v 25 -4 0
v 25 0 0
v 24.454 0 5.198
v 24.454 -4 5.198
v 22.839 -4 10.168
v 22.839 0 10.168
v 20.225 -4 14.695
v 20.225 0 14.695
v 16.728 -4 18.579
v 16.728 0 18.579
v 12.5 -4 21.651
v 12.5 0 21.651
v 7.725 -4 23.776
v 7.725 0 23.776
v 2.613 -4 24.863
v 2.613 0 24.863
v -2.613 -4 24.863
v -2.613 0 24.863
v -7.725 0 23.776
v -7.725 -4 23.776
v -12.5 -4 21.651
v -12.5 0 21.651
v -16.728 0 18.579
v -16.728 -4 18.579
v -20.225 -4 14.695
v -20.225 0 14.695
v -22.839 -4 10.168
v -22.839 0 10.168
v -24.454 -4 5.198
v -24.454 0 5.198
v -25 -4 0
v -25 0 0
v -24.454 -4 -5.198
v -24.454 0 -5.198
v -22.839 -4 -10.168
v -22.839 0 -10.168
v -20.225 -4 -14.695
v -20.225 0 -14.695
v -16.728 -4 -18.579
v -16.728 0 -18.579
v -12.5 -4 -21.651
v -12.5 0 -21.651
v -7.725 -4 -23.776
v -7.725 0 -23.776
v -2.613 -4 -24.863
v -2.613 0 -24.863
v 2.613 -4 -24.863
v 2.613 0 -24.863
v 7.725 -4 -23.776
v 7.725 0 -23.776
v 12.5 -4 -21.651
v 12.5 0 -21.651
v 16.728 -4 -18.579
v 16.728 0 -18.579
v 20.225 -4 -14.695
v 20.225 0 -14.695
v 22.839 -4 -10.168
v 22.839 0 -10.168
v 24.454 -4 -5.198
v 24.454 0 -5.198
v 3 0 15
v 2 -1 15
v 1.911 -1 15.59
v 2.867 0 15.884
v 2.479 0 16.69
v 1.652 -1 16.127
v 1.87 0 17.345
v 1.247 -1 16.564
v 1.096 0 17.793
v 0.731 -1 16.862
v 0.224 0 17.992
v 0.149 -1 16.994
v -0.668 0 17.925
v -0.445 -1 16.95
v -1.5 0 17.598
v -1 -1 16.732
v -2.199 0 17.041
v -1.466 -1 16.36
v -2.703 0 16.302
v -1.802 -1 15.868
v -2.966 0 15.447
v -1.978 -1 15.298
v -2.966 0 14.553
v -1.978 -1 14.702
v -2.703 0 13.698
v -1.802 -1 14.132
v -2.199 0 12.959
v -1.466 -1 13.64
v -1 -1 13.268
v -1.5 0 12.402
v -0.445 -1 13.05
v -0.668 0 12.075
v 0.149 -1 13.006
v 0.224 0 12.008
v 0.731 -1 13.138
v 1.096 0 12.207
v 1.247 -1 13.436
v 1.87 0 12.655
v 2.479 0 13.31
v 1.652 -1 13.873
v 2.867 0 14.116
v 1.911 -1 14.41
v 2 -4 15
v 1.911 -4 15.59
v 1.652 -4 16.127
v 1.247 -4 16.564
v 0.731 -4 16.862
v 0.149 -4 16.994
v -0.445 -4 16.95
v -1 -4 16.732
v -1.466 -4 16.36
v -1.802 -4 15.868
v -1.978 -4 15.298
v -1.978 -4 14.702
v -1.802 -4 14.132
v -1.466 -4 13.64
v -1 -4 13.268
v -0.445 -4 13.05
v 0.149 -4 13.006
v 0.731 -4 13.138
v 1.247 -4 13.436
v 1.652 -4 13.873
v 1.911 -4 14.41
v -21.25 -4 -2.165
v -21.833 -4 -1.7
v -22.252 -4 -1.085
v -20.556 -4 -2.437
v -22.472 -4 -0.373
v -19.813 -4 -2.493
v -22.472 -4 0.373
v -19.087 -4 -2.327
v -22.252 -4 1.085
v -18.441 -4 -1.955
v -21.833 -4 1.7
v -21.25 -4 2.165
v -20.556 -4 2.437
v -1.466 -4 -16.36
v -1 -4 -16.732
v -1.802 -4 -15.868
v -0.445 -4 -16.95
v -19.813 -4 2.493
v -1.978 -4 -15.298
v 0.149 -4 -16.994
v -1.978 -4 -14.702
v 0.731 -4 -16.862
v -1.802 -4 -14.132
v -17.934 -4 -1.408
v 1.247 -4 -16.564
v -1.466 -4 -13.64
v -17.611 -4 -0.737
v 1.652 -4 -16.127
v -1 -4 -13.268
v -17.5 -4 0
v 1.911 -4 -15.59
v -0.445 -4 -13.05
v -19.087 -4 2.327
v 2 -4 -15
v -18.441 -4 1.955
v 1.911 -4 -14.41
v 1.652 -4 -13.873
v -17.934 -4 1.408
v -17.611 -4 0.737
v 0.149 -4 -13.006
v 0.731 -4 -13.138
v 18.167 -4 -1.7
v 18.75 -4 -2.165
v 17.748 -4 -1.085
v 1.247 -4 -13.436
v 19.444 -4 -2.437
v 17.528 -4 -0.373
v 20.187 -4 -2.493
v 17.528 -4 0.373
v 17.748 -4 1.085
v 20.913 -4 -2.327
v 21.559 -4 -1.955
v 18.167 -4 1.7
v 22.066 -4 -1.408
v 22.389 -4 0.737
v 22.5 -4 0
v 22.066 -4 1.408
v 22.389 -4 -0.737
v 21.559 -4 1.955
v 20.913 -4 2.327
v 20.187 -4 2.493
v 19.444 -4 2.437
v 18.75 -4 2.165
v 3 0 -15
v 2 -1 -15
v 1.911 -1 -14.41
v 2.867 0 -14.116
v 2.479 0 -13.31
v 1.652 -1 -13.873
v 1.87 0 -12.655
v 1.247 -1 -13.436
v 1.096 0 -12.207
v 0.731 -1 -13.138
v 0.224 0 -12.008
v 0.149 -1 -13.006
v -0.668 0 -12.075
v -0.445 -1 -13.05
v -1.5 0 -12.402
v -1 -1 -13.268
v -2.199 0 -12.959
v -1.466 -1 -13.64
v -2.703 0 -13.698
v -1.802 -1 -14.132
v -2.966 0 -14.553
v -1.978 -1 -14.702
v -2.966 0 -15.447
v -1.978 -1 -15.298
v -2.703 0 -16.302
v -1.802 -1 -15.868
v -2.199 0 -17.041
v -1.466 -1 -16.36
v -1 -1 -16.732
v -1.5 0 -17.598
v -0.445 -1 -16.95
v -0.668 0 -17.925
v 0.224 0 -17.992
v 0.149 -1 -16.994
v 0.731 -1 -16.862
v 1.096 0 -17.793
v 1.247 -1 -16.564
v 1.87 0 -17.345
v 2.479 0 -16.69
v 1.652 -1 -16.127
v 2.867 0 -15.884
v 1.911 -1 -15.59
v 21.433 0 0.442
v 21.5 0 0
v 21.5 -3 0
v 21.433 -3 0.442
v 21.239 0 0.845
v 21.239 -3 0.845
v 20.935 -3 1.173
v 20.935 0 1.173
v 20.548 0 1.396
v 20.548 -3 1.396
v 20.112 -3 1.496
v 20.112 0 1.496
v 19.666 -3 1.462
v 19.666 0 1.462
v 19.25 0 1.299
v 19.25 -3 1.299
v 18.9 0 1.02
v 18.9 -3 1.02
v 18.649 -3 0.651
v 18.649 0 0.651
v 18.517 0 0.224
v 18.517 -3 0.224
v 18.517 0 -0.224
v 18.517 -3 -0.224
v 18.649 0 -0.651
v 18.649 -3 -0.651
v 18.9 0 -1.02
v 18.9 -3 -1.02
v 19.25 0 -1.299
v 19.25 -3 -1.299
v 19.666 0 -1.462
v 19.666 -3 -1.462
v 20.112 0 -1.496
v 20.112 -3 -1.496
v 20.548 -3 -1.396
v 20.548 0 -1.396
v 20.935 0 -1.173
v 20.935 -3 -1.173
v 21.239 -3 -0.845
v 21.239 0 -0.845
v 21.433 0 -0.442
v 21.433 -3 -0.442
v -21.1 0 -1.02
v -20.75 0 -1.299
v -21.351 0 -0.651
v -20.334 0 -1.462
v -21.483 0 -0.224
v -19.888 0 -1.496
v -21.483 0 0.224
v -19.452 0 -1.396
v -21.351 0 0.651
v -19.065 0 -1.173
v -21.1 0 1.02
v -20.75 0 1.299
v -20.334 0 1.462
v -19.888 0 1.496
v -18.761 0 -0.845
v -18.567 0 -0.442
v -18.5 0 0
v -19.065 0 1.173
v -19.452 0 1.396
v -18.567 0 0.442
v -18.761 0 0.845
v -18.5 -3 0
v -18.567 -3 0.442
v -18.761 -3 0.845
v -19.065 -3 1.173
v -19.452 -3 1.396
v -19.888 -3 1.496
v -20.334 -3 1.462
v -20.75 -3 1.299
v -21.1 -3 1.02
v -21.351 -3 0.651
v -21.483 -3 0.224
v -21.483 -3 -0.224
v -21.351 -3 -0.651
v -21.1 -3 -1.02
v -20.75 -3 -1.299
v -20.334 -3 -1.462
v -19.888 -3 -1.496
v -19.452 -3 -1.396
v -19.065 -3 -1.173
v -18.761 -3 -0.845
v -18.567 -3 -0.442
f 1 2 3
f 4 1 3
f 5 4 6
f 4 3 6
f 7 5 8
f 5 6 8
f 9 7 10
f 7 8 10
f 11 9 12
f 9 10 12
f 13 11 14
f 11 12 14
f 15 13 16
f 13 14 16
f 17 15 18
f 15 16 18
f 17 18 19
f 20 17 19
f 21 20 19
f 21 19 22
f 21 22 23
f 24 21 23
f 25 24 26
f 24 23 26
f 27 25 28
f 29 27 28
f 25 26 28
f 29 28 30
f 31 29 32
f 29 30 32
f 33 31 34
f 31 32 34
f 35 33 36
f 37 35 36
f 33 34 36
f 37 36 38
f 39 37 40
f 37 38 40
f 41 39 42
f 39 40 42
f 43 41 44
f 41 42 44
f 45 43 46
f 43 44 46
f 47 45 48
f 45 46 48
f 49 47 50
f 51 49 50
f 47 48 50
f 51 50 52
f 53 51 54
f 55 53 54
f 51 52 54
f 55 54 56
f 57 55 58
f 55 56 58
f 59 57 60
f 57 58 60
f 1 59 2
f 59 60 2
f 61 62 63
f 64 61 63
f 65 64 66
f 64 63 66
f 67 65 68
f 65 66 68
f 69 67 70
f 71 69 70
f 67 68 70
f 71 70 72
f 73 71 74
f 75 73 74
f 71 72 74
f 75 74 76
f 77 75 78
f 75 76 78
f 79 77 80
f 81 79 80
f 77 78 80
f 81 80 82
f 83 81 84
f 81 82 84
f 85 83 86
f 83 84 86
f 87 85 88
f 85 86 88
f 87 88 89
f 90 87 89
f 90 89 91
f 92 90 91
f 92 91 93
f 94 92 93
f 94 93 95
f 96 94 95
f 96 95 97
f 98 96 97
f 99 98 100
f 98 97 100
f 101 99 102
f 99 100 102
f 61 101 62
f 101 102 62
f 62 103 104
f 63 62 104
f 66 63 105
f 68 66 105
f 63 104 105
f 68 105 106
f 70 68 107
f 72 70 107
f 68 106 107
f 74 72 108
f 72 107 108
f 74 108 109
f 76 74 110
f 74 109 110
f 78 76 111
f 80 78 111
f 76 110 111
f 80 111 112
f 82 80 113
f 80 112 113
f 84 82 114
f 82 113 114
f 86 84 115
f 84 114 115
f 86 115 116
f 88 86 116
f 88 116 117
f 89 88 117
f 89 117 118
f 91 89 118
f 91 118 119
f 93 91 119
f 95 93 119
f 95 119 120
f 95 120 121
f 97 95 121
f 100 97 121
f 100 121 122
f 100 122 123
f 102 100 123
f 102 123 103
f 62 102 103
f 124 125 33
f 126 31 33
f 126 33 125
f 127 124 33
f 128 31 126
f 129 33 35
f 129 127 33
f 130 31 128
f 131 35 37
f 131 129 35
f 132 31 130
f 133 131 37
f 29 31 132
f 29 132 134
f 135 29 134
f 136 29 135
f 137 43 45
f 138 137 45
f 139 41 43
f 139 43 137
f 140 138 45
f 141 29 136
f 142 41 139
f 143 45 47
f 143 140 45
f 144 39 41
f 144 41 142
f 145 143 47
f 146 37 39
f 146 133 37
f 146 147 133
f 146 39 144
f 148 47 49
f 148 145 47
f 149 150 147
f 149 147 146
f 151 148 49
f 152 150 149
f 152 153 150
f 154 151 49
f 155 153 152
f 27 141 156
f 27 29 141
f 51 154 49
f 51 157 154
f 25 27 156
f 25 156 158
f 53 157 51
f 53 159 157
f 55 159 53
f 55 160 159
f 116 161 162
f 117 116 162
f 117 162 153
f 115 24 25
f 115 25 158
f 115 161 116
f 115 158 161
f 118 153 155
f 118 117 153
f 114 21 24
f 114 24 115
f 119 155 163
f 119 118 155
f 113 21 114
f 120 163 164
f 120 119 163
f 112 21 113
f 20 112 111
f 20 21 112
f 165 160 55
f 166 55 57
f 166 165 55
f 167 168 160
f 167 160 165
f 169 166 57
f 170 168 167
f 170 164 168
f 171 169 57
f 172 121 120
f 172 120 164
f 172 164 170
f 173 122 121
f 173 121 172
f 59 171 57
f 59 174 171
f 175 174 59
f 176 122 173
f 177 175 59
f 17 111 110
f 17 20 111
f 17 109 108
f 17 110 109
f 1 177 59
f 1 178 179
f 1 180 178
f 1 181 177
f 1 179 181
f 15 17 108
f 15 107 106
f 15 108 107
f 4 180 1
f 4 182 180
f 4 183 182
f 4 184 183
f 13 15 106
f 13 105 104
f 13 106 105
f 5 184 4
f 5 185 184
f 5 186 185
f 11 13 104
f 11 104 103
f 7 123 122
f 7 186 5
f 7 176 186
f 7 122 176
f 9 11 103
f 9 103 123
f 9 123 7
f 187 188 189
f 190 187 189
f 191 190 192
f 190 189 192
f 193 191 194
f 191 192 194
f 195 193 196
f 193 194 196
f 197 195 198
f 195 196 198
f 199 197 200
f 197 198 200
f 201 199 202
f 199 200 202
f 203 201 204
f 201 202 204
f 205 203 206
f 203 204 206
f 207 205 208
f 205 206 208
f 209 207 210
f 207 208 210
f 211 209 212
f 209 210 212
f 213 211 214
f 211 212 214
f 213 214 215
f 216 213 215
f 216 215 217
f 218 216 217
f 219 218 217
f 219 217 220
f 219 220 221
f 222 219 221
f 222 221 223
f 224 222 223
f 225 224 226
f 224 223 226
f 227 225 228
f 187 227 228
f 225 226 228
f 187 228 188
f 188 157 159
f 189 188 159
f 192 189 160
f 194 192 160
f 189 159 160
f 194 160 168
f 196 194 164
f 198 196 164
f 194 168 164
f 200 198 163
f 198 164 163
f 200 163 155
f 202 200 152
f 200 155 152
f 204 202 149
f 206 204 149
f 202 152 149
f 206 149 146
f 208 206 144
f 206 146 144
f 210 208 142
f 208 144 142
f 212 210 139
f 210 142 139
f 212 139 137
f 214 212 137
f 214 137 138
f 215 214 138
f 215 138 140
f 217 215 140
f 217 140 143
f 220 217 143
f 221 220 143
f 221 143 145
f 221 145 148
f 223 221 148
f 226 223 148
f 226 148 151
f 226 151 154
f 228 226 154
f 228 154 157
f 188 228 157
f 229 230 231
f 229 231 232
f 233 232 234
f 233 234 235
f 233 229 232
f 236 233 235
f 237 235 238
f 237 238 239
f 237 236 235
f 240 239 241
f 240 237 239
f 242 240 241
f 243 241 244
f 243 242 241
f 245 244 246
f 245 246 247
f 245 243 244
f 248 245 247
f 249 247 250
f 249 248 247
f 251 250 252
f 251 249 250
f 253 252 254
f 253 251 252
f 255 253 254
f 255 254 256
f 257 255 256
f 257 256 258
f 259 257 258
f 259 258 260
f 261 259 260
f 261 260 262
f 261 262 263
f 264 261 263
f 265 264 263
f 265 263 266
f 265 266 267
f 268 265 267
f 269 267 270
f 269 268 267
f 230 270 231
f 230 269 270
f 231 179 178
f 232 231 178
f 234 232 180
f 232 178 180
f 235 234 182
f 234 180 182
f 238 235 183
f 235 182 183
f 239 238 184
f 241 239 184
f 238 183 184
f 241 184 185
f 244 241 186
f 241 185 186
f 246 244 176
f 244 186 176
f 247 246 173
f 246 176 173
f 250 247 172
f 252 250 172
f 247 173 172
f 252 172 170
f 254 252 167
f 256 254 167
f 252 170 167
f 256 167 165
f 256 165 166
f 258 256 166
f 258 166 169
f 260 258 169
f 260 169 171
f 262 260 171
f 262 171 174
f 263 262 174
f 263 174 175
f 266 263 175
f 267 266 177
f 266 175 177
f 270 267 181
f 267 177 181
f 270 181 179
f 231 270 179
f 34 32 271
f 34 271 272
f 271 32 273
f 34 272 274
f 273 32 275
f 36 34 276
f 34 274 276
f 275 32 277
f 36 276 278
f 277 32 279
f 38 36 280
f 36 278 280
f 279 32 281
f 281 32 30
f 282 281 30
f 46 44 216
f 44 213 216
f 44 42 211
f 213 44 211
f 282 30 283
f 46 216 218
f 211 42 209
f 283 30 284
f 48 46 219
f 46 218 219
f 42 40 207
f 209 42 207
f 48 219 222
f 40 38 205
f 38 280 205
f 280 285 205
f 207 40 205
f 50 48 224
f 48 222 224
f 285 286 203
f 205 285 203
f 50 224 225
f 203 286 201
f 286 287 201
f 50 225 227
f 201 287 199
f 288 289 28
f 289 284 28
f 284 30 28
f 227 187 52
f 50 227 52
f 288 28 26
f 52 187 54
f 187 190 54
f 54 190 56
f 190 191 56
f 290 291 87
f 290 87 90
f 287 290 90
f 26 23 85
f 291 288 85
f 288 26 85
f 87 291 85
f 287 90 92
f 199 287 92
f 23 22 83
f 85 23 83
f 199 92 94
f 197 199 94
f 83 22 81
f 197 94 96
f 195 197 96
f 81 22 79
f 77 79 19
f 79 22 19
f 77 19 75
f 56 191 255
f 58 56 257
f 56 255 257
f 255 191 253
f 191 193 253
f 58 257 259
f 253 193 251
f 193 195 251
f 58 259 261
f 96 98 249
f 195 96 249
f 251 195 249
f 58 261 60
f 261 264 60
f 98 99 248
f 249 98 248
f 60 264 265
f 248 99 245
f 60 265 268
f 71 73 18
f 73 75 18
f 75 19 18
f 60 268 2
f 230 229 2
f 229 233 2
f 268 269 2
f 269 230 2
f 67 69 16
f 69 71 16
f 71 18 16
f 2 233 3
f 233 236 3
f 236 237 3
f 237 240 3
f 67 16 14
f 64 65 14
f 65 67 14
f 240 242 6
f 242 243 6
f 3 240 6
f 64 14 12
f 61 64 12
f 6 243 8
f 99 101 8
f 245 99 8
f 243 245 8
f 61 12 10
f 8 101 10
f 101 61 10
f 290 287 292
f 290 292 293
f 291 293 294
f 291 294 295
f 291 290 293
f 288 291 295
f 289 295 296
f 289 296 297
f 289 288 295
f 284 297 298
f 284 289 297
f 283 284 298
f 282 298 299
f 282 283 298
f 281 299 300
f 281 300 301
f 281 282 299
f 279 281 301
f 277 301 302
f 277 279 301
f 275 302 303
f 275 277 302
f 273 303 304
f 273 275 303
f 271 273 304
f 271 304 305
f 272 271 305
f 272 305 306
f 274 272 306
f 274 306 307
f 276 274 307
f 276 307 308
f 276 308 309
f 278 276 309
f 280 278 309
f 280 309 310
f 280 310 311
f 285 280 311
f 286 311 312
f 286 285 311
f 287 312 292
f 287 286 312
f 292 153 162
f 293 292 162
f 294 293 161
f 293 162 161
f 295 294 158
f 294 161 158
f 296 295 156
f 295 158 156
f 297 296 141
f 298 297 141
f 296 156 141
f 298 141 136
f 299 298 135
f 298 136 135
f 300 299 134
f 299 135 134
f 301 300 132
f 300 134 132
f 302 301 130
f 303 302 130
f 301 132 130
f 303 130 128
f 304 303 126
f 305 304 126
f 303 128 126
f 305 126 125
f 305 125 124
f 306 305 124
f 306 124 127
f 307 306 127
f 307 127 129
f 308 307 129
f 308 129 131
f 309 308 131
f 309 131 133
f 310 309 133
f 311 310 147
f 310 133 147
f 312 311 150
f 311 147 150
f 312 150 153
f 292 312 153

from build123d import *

# Parameters (mm, degrees)
F0_R     = 25
F0_R_2   = 1.5
F1_DEPTH = 4
F2_SIZE  = 1
F3_R     = 2
F4_DEPTH = 4.001
F5_SIZE  = 1


with BuildPart() as f1:
    # F0 (on Front) → F1 (new body)
    with BuildSketch(Plane.XZ):
        Circle(F0_R)
        with Locations((-20, 0)):
            Circle(F0_R_2, mode=Mode.SUBTRACT)
        with Locations((20, 0)):
            Circle(F0_R_2, mode=Mode.SUBTRACT)
    extrude(amount=F1_DEPTH)

    # F2
    f2_edges = [f1.edges().sort_by_distance(p)[0] for p in [
        (-21.5, -4, 0),
        (18.5, -4, 0),
    ]]
    chamfer(f2_edges, length=F2_SIZE)

    # F3 (on face) → F4 (cut, through all)
    with BuildSketch(Plane.XZ.offset(4)):
        with Locations((0, 15)):
            Circle(F3_R)
        with Locations((0, -15)):
            Circle(F3_R)
    extrude(amount=-F4_DEPTH, mode=Mode.SUBTRACT)

    # F5
    f5_edges = [f1.edges().sort_by_distance(p)[0] for p in [
        (-2, 0, 15),
        (-2, 0, -15),
    ]]
    chamfer(f5_edges, length=F5_SIZE)


solid = f1.part
